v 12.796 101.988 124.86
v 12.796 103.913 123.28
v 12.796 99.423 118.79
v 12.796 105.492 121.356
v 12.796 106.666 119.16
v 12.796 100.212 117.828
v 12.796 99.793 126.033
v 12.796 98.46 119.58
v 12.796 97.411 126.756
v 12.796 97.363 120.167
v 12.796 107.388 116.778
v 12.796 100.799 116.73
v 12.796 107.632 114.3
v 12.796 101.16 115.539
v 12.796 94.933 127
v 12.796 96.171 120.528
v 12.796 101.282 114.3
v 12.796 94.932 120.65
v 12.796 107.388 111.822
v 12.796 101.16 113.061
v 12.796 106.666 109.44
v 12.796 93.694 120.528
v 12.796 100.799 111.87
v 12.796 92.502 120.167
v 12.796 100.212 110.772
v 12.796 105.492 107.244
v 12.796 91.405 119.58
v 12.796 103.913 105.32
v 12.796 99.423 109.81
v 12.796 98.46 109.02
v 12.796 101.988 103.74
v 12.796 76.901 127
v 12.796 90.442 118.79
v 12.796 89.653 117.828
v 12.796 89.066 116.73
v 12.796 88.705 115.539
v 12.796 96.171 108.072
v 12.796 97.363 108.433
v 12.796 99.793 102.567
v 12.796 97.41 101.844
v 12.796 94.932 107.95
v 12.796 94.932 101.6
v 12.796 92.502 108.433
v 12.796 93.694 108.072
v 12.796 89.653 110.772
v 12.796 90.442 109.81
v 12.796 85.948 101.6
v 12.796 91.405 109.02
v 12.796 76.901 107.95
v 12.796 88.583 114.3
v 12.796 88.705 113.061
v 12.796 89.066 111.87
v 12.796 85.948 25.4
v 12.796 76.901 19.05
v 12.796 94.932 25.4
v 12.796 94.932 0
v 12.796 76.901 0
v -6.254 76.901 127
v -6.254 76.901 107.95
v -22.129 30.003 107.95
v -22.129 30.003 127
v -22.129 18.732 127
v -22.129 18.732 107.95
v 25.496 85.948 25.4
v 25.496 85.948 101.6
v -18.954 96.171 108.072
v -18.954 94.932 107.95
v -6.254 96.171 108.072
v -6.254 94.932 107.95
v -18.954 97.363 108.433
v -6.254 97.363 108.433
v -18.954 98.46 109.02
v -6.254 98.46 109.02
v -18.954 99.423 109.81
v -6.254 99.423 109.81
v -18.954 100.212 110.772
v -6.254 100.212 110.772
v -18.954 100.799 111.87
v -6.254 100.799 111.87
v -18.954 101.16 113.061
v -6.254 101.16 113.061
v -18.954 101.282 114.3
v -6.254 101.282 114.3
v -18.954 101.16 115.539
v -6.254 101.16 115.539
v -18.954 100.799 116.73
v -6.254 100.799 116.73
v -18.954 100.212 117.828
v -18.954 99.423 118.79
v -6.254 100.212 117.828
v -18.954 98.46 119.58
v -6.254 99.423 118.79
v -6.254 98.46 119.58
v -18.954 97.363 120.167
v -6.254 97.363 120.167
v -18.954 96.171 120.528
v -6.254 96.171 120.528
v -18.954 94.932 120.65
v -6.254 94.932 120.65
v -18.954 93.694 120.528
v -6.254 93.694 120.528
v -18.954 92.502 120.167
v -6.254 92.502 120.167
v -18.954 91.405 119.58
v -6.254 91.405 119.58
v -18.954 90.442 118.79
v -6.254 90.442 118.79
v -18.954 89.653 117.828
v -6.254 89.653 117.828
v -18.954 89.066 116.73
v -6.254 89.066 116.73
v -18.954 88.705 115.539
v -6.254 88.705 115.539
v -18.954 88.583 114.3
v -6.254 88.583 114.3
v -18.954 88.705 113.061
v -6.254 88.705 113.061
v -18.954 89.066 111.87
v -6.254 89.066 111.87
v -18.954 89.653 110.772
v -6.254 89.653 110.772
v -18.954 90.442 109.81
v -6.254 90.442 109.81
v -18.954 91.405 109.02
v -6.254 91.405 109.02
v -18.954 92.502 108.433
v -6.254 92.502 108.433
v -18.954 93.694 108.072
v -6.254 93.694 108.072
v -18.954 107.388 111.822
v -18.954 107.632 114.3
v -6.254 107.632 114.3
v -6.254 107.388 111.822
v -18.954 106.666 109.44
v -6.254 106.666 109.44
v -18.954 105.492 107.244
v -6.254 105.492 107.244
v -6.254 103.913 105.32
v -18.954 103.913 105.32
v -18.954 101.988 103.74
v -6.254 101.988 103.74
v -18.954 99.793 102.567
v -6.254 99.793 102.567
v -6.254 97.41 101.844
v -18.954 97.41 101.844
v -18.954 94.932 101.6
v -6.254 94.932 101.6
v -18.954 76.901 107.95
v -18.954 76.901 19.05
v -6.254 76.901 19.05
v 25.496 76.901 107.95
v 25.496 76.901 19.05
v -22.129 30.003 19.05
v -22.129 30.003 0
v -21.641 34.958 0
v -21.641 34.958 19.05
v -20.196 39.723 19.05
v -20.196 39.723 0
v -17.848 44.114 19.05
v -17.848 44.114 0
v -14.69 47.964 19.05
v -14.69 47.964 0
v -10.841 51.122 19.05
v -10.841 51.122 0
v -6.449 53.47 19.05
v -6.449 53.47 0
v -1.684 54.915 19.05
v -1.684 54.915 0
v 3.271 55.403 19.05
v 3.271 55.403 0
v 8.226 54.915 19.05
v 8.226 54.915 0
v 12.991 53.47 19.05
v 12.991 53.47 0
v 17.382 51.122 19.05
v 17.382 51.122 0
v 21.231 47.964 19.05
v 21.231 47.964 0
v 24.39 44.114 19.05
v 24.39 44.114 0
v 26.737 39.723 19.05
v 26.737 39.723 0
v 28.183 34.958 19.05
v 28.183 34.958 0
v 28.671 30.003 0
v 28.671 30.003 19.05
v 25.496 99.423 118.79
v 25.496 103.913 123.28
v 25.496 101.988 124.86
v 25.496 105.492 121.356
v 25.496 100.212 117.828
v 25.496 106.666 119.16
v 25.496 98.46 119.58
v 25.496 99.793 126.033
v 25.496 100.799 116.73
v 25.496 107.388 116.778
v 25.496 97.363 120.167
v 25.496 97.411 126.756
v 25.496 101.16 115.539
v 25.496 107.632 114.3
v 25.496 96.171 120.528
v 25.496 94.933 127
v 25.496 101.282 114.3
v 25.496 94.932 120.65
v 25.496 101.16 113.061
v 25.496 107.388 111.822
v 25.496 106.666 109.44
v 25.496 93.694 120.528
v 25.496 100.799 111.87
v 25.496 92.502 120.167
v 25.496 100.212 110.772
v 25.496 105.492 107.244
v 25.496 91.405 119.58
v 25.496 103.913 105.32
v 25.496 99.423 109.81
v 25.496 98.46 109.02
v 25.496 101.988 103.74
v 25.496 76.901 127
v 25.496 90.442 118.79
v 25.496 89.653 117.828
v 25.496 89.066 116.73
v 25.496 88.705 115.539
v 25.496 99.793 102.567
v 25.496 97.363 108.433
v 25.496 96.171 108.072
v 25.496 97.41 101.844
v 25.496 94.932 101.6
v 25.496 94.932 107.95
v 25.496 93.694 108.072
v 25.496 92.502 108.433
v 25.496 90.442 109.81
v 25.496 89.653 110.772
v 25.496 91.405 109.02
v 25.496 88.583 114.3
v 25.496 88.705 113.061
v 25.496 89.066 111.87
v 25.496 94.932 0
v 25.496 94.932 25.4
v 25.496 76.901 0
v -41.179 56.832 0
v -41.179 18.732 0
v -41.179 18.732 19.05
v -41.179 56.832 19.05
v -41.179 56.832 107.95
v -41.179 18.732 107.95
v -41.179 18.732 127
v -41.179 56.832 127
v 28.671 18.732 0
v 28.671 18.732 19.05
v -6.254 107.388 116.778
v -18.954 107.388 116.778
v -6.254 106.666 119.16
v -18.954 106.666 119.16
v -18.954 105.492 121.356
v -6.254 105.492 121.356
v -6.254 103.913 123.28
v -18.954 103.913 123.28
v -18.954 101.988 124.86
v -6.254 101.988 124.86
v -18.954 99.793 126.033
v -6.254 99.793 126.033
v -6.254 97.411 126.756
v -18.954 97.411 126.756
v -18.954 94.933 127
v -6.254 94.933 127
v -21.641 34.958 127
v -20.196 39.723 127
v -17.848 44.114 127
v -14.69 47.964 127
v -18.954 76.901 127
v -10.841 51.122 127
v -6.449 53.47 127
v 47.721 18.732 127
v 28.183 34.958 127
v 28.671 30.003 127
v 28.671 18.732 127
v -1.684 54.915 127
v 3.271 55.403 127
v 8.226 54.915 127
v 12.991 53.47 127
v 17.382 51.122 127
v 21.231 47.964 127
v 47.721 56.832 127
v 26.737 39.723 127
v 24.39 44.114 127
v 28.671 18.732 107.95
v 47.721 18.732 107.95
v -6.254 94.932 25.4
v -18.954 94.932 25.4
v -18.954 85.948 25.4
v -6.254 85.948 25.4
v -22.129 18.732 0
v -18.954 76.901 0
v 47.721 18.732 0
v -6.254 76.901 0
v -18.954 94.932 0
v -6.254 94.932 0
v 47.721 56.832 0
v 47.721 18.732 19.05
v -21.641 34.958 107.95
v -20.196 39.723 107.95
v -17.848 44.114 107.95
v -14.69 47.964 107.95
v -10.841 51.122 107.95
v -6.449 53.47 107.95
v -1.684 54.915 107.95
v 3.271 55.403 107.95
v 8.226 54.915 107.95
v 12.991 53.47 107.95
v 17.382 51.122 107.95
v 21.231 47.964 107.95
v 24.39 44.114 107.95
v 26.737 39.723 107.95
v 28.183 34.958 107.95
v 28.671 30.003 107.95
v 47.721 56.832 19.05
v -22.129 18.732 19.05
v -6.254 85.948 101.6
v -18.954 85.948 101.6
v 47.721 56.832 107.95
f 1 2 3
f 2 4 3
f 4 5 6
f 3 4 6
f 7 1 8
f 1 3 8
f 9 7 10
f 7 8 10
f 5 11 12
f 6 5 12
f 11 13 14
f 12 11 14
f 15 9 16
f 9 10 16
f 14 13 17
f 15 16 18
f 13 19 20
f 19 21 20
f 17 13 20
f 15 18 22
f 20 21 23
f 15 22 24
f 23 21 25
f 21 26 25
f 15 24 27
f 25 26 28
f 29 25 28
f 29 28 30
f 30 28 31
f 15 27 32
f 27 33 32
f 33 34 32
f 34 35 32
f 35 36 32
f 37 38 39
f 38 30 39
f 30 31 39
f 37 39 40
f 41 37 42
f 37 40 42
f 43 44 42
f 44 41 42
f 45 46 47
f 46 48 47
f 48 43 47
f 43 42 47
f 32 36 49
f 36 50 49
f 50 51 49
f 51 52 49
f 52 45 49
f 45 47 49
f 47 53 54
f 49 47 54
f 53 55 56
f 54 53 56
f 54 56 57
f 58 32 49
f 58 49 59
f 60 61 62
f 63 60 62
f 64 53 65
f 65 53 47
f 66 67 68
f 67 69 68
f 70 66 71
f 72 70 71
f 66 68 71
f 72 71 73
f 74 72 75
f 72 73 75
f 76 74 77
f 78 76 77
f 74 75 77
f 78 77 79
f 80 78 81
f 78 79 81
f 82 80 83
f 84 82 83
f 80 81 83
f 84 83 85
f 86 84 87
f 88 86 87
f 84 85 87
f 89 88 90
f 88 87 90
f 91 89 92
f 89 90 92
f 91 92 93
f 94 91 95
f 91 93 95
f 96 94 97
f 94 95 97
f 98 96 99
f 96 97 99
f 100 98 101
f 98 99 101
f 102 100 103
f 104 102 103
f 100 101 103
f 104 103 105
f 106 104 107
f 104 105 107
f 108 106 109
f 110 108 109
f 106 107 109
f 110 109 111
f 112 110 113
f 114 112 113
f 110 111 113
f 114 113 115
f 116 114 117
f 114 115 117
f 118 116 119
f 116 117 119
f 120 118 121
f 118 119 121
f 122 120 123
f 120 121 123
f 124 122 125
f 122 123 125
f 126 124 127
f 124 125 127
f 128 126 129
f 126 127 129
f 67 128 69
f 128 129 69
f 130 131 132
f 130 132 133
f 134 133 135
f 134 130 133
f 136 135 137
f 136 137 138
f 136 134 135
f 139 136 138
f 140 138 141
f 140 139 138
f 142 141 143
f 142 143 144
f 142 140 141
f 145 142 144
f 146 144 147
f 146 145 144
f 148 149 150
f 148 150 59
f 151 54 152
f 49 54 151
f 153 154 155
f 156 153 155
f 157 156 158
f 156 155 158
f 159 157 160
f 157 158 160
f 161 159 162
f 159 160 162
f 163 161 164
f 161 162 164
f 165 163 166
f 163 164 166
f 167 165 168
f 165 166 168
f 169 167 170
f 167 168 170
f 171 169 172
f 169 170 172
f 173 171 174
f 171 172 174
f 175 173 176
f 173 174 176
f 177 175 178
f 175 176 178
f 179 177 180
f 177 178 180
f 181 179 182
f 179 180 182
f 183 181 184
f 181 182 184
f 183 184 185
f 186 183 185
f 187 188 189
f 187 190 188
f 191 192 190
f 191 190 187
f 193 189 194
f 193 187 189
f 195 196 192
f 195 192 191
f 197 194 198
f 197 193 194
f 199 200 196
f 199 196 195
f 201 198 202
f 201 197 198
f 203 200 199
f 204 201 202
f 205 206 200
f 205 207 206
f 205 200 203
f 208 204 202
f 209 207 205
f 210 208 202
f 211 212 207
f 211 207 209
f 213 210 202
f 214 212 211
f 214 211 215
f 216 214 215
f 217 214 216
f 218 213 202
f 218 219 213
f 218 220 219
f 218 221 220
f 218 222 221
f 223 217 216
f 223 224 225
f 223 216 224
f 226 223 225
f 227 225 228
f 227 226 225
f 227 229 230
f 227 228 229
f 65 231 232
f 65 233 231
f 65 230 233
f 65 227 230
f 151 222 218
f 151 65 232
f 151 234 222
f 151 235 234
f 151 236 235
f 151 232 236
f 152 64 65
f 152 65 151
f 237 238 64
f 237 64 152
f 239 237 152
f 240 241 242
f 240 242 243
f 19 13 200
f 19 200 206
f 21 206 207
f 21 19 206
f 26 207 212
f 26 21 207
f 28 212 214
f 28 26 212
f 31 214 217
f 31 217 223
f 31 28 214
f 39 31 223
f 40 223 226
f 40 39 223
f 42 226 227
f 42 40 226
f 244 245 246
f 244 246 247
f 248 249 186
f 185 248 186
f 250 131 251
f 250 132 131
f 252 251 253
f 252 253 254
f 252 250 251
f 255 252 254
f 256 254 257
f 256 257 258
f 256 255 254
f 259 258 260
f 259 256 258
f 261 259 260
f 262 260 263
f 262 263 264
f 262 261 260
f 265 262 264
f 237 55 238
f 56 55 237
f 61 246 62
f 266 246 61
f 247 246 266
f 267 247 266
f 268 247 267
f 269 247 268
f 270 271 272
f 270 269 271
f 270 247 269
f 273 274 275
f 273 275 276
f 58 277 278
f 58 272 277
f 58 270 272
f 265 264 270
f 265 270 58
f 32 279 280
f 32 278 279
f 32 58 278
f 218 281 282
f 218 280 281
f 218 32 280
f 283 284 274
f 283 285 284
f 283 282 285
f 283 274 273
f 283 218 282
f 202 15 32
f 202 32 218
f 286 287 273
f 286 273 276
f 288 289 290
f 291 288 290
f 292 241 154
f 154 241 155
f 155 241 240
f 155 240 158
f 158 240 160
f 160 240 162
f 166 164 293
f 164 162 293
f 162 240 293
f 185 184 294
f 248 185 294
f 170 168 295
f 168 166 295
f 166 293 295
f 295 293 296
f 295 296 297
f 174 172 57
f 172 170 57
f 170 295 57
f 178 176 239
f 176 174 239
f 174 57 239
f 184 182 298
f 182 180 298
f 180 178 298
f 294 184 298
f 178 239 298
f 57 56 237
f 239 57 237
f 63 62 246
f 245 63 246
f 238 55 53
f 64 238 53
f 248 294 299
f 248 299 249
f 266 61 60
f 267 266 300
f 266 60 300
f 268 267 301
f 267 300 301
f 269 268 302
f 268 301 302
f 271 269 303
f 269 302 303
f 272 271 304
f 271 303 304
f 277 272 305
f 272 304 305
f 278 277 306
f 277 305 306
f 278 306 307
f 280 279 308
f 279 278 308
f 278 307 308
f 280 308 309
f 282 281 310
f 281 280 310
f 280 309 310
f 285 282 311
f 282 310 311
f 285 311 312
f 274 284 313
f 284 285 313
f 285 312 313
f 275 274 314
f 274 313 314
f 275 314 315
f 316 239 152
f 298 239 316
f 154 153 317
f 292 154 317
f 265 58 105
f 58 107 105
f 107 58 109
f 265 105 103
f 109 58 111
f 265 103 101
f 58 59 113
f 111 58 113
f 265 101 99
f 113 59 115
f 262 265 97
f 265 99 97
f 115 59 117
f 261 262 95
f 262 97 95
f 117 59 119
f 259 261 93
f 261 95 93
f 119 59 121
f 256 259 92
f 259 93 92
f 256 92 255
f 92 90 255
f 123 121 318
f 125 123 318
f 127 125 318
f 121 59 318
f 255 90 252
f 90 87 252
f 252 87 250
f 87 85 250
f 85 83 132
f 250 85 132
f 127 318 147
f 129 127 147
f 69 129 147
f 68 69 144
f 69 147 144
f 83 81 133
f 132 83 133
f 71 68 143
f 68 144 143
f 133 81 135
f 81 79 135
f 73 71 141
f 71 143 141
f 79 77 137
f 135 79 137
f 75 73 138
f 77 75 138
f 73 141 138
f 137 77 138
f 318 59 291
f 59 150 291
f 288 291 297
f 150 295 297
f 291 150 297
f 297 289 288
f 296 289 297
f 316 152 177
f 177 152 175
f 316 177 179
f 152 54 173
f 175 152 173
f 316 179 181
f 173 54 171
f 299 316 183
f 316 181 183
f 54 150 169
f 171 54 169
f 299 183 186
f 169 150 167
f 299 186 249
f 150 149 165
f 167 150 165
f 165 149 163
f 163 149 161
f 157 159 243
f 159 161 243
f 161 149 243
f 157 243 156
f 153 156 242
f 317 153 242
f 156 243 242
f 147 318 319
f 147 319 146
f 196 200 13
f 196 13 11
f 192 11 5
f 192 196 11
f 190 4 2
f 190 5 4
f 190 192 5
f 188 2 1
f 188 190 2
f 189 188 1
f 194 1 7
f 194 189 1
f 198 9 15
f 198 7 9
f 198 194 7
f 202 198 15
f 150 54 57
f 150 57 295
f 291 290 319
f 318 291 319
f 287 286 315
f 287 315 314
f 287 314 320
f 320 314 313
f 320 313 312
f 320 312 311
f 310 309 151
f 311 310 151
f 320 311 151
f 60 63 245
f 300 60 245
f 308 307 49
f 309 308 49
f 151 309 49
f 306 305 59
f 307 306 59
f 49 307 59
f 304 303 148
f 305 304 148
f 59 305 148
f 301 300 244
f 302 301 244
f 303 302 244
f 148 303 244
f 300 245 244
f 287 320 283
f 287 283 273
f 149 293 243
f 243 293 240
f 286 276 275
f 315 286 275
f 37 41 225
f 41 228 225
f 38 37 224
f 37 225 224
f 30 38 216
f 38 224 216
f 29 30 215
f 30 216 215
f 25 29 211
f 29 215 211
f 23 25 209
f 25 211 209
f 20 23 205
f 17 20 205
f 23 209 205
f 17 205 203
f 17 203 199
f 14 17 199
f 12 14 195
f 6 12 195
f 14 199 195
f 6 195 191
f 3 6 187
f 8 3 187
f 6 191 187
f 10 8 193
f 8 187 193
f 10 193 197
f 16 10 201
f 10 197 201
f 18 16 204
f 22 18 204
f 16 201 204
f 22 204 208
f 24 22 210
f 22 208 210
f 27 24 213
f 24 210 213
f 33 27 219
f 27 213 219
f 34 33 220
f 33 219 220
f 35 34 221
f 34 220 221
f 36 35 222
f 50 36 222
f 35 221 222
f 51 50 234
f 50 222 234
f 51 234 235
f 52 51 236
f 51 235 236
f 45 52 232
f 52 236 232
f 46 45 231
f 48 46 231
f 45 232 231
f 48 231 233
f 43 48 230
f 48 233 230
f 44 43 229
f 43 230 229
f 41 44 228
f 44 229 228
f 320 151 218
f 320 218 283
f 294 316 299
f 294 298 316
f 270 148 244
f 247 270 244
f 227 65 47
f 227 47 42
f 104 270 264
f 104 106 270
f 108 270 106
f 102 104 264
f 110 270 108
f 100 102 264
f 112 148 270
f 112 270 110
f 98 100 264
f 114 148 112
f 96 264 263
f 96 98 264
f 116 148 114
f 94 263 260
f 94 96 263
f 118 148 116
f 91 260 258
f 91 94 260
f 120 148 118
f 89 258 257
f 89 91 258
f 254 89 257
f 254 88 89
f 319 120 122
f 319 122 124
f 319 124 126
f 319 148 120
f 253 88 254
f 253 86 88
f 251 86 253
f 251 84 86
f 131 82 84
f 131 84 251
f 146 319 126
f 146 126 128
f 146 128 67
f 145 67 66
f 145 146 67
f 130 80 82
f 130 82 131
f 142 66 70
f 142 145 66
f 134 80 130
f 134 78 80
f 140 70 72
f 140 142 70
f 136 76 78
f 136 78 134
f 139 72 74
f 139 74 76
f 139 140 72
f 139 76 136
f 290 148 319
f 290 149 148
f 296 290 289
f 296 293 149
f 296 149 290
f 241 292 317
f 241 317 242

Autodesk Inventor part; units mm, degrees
ref_plane "YZ Plane" through (0, 0, 0) normal (1, 0, 0) x (0, 1, 0)
ref_plane "XZ Plane" through (0, 0, 0) normal (0, 1, 0) x (-1, 0, 0)
ref_plane "XY Plane" through (0, 0, 0) normal (0, 0, 1) x (1, 0, 0)
sketch "front profile" plane through (0, 0, 0) normal (0, 0, 1) x (1, 0, 0)
  line L0 (47.7209, 56.8325) -> (47.7209, 18.7325)
  line L1 (-41.1791, 18.7325) -> (-41.1791, 56.8325)
  line L2 (25.4959, 107.6325) -> (25.4959, 76.9011)
  line L3 (12.7959, 76.9011) -> (-6.2541, 76.9011)
  line L4 (-18.9541, 76.9011) -> (-18.9541, 107.6325)
  line L5 (12.7959, 107.6325) -> (12.7959, 76.9011)
  line L6 (12.7959, 76.9011) -> (-6.2541, 76.9011)
  line L7 (-6.2541, 76.9011) -> (-6.2541, 107.6325)
  line L8 (25.4959, 76.9011) -> (47.7209, 56.8325)
  line L9 (-18.9541, 76.9011) -> (-41.1791, 56.8325)
  line L10 (28.6709, 18.7325) -> (28.6709, 30.003)
  line L11 (-22.1291, 30.003) -> (-22.1291, 18.7325)
  arc A0 (28.6709, 30.003) -> (-22.1291, 30.003) centre (3.2709, 30.003) ccw
  line L12 (-18.9541, 107.6325) -> (-6.2541, 107.6325)
  line L13 (12.7959, 107.6325) -> (25.4959, 107.6325)
  line L14 (47.7209, 18.7325) -> (28.6709, 18.7325)
  line L15 (-22.1291, 18.7325) -> (-41.1791, 18.7325)
  line L16 (-18.9541, 107.6325) -> (-6.2541, 107.6325)
  line L17 (12.7959, 107.6325) -> (25.4959, 107.6325)
  point P0 (-6.2541, 92.2668)
  point P1 (-12.6041, 107.6325)
  point P2 (19.1459, 107.6325)
  dimension "d2" = 88.9
  dimension "d9" = 22.225
  dimension "d10" = 22.225
  dimension "d11" = 12.7
  dimension "d12" = 12.7
  dimension "d14" = 38.1
  dimension "d15" = 38.1
  dimension "d17" = 19.05
  dimension "d18" = 19.05
  dimension "d32" = 88.9
  dimension "d33" = 88.9
  dimension "d34" = 25.4
  dimension "d36" = 47.919
  dimension "d37" = 47.919
  dimension "d39" = 58.1686
  dimension "d40" = 88.9
  dimension "d43" = 11.2705
extrude "front profile Extrusion" add sketch "front profile" along normal blind 127
sketch "side profile" plane through (25.4959, 76.9011, 0) normal (1, 0, 0) x (0, 0, -1)
  line L0 (0, -20.0686) -> (0, -58.1686) projected
  line L1 (-127, 30.7314) -> (0, 30.7314)
  line L2 (0, 30.7314) -> (0, -58.1686)
  line L3 (0, -58.1686) -> (-127, -58.1686)
  line L4 (-127, -58.1686) -> (-127, 18.0314)
  line L5 (-25.4, 18.0314) -> (-25.4, 9.0465)
  line L6 (-25.4, 9.0465) -> (-101.6, 9.0465)
  line L7 (-101.6, 9.0465) -> (-101.6, 18.0314)
  line L8 (0, 0) -> (-127, 0) projected
  line L9 (0, -58.1686) -> (-127, -58.1686) projected
  line L10 (-107.95, 0) -> (-19.05, 0)
  line L11 (-19.05, 0) -> (-19.05, -58.1686)
  line L12 (-19.05, -58.1686) -> (-107.95, -58.1686)
  line L13 (-107.95, -58.1686) -> (-107.95, 0)
  circle A0 centre (-114.3, 18.0314) radius 6.35
  arc A1 (-101.6, 18.0314) -> (-127, 18.0314) centre (-114.3, 18.0314) ccw
  line L14 (0, 30.7314) -> (-127, 30.7314) projected
  line L15 (-25.4, 18.0314) -> (0, 18.0314)
  point P0 (0, -76.9011)
  point P1 (-114.3, 30.7314)
  point P2 (-107.95, -58.1686)
  point P3 (-19.05, -58.1686)
  point P4 (-19.05, 0)
  dimension "d23" = 25.4
  dimension "d24" = 19.05
  dimension "d25" = 19.05
  dimension "d26" = 12.7
  dimension "d27" = 12.7
  dimension "d35" = 127
  dimension "d45" = 12.7
  dimension "d46" = 30.7314
  dimension "d47" = 19.05
  dimension "d48" = 88.9
  dimension "d49" = 19.05
  dimension "d50" = 88.9
  dimension "d51" = 107.95
  dimension "d52" = 0
  dimension "d53" = 114.3
  dimension "d54" = 21.6849
extrude "side profile extrusion" cut sketch "side profile" along normal through all both and the other way through all contours L3 L13 L8 L11 | L15 L5 L6 L7 A1 L1 L2 | A0
fillet "Front Fillet" radius 12.7 2 edges at (19.1459, 107.6325, 127) (-12.6041, 107.6325, 127)
equation "\"d10\" = d9"
equation "\"d12\" = d11"
equation "\"d15\" = d14"
equation "\"d17\" = d16"
equation "\"d33\" = d32"
equation "\"d37\" = d36"
equation "\"d25\" = d24"
equation "\"d16\" = 19.05"
properties part number "ASN4-4-BK" material "Iron, Cast"
